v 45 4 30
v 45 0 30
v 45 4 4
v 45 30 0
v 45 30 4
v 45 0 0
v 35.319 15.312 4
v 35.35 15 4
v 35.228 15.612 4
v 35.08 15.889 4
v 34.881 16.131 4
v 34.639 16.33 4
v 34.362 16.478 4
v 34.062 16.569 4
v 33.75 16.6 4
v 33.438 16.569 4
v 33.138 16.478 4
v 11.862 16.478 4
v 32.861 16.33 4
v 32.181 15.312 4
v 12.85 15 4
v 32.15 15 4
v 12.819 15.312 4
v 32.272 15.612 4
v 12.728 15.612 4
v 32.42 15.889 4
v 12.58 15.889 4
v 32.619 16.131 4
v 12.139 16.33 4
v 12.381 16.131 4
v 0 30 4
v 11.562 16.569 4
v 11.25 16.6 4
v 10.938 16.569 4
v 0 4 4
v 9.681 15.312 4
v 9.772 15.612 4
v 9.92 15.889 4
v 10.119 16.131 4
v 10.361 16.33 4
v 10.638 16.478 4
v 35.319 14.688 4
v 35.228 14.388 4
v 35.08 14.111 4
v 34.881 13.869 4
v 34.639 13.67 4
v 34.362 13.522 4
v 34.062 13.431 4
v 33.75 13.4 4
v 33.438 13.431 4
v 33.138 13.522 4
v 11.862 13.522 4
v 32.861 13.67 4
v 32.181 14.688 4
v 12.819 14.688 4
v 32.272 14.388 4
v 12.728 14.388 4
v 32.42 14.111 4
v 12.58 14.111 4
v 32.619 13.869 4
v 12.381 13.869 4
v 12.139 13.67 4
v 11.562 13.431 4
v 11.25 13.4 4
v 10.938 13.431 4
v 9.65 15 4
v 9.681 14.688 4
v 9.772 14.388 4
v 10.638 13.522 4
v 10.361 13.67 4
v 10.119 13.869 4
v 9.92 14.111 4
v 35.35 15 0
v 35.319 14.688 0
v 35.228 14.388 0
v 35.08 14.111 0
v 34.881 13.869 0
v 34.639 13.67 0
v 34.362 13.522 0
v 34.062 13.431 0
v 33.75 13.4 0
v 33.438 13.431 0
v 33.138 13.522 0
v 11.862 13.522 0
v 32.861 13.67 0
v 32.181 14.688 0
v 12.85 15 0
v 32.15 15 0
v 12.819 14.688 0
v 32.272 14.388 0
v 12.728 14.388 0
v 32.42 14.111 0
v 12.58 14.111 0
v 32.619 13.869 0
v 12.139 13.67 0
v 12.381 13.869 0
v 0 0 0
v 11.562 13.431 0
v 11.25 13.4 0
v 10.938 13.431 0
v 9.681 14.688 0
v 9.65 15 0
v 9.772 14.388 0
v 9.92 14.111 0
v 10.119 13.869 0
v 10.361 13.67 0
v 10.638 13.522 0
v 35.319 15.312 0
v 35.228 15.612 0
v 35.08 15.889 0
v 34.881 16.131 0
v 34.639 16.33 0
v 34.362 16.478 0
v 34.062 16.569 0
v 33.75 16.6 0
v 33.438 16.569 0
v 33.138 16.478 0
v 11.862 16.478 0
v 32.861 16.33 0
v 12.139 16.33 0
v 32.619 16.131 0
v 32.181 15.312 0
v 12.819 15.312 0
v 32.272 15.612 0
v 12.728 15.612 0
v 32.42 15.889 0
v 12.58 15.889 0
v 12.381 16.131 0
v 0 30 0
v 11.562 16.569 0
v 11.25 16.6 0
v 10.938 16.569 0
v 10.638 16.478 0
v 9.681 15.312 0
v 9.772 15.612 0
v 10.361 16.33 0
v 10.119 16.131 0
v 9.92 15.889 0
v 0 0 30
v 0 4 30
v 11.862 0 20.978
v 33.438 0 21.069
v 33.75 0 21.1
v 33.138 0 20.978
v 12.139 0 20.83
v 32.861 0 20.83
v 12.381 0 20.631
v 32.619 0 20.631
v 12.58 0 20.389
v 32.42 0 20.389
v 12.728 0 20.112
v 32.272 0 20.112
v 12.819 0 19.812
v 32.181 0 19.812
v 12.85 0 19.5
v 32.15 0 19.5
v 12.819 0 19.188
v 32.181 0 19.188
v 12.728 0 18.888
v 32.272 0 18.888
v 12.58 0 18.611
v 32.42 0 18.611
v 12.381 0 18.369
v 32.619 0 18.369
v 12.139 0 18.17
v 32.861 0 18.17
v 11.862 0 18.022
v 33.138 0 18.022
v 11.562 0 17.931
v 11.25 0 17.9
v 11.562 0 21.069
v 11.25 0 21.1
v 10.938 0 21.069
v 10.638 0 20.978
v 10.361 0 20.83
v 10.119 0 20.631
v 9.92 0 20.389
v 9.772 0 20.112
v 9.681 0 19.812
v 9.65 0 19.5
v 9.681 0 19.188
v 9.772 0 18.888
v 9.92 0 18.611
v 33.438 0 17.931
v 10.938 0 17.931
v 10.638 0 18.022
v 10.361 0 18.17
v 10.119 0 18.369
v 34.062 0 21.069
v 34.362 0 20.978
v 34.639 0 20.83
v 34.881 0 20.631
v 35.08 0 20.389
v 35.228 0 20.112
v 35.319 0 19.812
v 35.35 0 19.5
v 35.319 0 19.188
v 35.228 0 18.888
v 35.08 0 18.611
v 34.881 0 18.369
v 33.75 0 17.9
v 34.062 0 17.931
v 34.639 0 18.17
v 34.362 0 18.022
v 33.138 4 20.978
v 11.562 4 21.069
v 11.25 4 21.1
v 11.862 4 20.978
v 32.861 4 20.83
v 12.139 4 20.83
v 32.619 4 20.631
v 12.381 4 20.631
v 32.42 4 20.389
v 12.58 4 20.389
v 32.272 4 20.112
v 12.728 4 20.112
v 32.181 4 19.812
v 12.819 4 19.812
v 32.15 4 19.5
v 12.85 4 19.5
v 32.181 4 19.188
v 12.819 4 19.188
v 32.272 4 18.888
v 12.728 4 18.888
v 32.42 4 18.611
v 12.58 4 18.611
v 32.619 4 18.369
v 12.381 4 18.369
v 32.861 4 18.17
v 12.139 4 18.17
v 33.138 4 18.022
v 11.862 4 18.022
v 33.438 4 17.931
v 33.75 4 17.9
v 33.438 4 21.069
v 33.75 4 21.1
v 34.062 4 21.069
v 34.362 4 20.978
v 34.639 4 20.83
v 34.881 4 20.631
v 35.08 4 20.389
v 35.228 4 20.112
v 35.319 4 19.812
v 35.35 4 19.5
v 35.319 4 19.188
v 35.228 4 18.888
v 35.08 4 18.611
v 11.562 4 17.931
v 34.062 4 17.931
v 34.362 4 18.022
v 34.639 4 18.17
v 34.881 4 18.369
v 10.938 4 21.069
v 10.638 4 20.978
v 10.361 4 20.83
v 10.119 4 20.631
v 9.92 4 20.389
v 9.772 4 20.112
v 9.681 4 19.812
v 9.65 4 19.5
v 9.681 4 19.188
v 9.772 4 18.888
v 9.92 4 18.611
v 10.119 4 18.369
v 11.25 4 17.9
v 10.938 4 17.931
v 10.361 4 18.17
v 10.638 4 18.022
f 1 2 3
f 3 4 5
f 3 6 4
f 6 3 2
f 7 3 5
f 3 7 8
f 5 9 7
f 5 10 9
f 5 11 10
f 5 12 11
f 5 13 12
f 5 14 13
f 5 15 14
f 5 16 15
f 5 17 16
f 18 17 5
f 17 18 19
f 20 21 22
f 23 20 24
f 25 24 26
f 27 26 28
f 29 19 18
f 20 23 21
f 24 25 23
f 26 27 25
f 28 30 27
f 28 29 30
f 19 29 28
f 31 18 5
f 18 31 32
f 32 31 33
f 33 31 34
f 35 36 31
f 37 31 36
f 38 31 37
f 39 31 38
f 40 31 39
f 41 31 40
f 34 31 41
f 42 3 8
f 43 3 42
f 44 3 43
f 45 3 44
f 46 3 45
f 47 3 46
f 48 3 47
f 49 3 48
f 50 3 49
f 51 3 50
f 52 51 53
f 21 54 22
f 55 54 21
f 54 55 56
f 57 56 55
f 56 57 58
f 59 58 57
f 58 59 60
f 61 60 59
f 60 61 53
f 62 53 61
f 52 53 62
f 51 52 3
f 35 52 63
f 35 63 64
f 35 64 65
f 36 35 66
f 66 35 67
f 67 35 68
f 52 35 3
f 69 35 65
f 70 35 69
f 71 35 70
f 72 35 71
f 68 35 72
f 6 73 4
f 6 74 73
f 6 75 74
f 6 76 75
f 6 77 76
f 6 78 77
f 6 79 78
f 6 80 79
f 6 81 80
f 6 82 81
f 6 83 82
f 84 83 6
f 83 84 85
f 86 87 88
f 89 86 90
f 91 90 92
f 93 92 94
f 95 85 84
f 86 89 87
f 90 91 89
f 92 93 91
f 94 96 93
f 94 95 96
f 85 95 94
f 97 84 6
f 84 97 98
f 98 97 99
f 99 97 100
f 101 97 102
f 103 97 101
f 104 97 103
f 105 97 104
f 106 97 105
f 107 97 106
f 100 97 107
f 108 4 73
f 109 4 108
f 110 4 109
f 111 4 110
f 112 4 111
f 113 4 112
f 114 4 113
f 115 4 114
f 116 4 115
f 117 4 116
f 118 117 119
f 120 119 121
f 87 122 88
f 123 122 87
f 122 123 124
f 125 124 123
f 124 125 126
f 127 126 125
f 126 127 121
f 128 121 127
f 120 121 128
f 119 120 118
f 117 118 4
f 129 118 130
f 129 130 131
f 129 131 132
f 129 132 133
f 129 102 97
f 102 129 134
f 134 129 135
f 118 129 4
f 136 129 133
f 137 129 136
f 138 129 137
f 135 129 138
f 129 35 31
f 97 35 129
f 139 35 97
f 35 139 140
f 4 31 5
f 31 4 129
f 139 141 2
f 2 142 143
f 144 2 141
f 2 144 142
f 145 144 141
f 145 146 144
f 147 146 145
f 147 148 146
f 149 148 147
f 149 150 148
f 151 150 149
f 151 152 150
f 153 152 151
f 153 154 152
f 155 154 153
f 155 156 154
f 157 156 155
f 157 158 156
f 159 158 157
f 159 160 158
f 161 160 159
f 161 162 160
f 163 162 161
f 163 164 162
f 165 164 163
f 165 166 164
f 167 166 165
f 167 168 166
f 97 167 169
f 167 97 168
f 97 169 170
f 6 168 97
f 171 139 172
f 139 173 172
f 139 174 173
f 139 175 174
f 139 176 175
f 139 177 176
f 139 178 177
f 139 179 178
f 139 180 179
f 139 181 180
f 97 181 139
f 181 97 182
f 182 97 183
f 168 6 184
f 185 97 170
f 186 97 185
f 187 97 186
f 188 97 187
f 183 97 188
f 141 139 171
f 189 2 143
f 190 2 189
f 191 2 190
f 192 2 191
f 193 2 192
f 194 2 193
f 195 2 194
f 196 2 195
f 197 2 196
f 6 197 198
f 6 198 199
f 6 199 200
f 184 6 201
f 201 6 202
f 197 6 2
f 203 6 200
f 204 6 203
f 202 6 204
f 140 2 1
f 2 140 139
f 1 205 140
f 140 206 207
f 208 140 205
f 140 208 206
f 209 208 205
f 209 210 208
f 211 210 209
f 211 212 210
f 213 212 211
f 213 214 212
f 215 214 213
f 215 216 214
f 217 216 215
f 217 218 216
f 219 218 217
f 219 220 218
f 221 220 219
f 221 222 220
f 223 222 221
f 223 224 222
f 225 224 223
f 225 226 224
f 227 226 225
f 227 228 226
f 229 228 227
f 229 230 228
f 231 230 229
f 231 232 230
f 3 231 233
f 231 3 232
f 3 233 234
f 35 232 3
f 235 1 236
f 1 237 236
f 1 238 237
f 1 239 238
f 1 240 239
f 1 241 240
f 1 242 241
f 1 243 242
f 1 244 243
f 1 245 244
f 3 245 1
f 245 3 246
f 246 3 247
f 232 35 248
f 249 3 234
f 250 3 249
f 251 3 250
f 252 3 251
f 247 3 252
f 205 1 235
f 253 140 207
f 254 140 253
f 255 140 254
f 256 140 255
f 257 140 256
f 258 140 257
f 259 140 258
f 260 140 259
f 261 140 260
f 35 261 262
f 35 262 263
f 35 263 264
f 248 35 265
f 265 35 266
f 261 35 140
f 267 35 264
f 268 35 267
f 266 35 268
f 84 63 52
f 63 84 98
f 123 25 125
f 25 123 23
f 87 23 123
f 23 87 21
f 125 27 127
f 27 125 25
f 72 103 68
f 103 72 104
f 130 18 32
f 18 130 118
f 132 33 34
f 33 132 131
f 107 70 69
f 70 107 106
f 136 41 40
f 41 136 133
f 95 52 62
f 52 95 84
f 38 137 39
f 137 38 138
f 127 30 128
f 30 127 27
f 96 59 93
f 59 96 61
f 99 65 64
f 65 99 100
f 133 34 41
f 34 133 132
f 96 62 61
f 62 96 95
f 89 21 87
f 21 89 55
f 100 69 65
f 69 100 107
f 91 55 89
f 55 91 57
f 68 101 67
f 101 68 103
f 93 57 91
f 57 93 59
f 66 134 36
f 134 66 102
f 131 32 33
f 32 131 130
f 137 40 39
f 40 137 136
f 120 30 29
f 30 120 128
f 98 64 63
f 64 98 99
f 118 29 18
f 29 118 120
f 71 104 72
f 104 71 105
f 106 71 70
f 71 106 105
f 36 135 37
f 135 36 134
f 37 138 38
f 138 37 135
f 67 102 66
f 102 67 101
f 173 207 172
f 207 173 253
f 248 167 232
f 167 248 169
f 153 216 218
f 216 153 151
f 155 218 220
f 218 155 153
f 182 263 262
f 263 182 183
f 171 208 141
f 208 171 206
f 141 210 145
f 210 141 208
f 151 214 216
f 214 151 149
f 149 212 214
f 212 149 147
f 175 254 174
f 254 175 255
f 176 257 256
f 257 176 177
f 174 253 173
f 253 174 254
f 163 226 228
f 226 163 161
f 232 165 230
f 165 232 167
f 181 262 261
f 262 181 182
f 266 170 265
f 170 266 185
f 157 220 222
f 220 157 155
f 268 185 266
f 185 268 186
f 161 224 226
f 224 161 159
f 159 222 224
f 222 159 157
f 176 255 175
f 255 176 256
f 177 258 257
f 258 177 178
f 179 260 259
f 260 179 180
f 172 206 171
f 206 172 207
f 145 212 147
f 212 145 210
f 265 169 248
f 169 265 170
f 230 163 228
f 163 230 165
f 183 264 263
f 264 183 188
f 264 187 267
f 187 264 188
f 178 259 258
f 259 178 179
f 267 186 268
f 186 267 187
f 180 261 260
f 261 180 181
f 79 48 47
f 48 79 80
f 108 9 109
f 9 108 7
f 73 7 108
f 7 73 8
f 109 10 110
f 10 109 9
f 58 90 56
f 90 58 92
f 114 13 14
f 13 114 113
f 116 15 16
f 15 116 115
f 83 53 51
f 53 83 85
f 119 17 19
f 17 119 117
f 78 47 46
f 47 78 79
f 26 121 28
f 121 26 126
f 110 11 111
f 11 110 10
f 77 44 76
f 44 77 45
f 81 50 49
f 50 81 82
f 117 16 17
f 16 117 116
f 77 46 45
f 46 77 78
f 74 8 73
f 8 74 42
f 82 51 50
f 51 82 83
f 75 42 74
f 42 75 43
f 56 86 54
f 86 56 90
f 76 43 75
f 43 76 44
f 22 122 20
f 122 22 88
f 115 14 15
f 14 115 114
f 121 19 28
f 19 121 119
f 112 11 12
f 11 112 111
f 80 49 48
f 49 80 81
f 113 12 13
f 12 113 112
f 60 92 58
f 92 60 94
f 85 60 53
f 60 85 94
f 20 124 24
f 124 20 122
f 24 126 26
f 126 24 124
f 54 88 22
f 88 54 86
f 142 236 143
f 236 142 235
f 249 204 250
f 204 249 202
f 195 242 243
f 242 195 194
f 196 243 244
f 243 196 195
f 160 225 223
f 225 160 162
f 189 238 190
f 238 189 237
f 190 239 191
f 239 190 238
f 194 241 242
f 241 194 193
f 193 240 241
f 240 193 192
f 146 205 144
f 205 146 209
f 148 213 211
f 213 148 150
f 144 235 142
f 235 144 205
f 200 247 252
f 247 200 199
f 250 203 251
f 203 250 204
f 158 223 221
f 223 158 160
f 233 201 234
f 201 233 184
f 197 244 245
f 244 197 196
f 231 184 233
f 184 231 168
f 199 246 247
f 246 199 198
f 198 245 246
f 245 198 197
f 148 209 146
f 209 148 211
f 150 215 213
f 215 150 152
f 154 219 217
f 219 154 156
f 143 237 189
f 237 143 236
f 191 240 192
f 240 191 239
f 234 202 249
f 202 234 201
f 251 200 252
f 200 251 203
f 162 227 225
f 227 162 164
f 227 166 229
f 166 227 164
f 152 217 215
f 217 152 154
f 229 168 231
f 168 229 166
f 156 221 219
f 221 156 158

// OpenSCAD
// L bracket concept; mm; no servo-specific fit or load rating.
width=45; depth=30; height=30; wall=4; hole=3.2;
assert(width>2*wall && depth>wall && height>wall && hole>0);
difference(){
  union(){cube([width,depth,wall]); cube([width,wall,height]);}
  for(x=[width/4,3*width/4]){
    translate([x,depth/2,-1]) cylinder(h=wall+2,d=hole,$fn=32);
    translate([x,wall+1,height*0.65]) rotate([90,0,0]) cylinder(h=wall+2,d=hole,$fn=32);
  }
}
